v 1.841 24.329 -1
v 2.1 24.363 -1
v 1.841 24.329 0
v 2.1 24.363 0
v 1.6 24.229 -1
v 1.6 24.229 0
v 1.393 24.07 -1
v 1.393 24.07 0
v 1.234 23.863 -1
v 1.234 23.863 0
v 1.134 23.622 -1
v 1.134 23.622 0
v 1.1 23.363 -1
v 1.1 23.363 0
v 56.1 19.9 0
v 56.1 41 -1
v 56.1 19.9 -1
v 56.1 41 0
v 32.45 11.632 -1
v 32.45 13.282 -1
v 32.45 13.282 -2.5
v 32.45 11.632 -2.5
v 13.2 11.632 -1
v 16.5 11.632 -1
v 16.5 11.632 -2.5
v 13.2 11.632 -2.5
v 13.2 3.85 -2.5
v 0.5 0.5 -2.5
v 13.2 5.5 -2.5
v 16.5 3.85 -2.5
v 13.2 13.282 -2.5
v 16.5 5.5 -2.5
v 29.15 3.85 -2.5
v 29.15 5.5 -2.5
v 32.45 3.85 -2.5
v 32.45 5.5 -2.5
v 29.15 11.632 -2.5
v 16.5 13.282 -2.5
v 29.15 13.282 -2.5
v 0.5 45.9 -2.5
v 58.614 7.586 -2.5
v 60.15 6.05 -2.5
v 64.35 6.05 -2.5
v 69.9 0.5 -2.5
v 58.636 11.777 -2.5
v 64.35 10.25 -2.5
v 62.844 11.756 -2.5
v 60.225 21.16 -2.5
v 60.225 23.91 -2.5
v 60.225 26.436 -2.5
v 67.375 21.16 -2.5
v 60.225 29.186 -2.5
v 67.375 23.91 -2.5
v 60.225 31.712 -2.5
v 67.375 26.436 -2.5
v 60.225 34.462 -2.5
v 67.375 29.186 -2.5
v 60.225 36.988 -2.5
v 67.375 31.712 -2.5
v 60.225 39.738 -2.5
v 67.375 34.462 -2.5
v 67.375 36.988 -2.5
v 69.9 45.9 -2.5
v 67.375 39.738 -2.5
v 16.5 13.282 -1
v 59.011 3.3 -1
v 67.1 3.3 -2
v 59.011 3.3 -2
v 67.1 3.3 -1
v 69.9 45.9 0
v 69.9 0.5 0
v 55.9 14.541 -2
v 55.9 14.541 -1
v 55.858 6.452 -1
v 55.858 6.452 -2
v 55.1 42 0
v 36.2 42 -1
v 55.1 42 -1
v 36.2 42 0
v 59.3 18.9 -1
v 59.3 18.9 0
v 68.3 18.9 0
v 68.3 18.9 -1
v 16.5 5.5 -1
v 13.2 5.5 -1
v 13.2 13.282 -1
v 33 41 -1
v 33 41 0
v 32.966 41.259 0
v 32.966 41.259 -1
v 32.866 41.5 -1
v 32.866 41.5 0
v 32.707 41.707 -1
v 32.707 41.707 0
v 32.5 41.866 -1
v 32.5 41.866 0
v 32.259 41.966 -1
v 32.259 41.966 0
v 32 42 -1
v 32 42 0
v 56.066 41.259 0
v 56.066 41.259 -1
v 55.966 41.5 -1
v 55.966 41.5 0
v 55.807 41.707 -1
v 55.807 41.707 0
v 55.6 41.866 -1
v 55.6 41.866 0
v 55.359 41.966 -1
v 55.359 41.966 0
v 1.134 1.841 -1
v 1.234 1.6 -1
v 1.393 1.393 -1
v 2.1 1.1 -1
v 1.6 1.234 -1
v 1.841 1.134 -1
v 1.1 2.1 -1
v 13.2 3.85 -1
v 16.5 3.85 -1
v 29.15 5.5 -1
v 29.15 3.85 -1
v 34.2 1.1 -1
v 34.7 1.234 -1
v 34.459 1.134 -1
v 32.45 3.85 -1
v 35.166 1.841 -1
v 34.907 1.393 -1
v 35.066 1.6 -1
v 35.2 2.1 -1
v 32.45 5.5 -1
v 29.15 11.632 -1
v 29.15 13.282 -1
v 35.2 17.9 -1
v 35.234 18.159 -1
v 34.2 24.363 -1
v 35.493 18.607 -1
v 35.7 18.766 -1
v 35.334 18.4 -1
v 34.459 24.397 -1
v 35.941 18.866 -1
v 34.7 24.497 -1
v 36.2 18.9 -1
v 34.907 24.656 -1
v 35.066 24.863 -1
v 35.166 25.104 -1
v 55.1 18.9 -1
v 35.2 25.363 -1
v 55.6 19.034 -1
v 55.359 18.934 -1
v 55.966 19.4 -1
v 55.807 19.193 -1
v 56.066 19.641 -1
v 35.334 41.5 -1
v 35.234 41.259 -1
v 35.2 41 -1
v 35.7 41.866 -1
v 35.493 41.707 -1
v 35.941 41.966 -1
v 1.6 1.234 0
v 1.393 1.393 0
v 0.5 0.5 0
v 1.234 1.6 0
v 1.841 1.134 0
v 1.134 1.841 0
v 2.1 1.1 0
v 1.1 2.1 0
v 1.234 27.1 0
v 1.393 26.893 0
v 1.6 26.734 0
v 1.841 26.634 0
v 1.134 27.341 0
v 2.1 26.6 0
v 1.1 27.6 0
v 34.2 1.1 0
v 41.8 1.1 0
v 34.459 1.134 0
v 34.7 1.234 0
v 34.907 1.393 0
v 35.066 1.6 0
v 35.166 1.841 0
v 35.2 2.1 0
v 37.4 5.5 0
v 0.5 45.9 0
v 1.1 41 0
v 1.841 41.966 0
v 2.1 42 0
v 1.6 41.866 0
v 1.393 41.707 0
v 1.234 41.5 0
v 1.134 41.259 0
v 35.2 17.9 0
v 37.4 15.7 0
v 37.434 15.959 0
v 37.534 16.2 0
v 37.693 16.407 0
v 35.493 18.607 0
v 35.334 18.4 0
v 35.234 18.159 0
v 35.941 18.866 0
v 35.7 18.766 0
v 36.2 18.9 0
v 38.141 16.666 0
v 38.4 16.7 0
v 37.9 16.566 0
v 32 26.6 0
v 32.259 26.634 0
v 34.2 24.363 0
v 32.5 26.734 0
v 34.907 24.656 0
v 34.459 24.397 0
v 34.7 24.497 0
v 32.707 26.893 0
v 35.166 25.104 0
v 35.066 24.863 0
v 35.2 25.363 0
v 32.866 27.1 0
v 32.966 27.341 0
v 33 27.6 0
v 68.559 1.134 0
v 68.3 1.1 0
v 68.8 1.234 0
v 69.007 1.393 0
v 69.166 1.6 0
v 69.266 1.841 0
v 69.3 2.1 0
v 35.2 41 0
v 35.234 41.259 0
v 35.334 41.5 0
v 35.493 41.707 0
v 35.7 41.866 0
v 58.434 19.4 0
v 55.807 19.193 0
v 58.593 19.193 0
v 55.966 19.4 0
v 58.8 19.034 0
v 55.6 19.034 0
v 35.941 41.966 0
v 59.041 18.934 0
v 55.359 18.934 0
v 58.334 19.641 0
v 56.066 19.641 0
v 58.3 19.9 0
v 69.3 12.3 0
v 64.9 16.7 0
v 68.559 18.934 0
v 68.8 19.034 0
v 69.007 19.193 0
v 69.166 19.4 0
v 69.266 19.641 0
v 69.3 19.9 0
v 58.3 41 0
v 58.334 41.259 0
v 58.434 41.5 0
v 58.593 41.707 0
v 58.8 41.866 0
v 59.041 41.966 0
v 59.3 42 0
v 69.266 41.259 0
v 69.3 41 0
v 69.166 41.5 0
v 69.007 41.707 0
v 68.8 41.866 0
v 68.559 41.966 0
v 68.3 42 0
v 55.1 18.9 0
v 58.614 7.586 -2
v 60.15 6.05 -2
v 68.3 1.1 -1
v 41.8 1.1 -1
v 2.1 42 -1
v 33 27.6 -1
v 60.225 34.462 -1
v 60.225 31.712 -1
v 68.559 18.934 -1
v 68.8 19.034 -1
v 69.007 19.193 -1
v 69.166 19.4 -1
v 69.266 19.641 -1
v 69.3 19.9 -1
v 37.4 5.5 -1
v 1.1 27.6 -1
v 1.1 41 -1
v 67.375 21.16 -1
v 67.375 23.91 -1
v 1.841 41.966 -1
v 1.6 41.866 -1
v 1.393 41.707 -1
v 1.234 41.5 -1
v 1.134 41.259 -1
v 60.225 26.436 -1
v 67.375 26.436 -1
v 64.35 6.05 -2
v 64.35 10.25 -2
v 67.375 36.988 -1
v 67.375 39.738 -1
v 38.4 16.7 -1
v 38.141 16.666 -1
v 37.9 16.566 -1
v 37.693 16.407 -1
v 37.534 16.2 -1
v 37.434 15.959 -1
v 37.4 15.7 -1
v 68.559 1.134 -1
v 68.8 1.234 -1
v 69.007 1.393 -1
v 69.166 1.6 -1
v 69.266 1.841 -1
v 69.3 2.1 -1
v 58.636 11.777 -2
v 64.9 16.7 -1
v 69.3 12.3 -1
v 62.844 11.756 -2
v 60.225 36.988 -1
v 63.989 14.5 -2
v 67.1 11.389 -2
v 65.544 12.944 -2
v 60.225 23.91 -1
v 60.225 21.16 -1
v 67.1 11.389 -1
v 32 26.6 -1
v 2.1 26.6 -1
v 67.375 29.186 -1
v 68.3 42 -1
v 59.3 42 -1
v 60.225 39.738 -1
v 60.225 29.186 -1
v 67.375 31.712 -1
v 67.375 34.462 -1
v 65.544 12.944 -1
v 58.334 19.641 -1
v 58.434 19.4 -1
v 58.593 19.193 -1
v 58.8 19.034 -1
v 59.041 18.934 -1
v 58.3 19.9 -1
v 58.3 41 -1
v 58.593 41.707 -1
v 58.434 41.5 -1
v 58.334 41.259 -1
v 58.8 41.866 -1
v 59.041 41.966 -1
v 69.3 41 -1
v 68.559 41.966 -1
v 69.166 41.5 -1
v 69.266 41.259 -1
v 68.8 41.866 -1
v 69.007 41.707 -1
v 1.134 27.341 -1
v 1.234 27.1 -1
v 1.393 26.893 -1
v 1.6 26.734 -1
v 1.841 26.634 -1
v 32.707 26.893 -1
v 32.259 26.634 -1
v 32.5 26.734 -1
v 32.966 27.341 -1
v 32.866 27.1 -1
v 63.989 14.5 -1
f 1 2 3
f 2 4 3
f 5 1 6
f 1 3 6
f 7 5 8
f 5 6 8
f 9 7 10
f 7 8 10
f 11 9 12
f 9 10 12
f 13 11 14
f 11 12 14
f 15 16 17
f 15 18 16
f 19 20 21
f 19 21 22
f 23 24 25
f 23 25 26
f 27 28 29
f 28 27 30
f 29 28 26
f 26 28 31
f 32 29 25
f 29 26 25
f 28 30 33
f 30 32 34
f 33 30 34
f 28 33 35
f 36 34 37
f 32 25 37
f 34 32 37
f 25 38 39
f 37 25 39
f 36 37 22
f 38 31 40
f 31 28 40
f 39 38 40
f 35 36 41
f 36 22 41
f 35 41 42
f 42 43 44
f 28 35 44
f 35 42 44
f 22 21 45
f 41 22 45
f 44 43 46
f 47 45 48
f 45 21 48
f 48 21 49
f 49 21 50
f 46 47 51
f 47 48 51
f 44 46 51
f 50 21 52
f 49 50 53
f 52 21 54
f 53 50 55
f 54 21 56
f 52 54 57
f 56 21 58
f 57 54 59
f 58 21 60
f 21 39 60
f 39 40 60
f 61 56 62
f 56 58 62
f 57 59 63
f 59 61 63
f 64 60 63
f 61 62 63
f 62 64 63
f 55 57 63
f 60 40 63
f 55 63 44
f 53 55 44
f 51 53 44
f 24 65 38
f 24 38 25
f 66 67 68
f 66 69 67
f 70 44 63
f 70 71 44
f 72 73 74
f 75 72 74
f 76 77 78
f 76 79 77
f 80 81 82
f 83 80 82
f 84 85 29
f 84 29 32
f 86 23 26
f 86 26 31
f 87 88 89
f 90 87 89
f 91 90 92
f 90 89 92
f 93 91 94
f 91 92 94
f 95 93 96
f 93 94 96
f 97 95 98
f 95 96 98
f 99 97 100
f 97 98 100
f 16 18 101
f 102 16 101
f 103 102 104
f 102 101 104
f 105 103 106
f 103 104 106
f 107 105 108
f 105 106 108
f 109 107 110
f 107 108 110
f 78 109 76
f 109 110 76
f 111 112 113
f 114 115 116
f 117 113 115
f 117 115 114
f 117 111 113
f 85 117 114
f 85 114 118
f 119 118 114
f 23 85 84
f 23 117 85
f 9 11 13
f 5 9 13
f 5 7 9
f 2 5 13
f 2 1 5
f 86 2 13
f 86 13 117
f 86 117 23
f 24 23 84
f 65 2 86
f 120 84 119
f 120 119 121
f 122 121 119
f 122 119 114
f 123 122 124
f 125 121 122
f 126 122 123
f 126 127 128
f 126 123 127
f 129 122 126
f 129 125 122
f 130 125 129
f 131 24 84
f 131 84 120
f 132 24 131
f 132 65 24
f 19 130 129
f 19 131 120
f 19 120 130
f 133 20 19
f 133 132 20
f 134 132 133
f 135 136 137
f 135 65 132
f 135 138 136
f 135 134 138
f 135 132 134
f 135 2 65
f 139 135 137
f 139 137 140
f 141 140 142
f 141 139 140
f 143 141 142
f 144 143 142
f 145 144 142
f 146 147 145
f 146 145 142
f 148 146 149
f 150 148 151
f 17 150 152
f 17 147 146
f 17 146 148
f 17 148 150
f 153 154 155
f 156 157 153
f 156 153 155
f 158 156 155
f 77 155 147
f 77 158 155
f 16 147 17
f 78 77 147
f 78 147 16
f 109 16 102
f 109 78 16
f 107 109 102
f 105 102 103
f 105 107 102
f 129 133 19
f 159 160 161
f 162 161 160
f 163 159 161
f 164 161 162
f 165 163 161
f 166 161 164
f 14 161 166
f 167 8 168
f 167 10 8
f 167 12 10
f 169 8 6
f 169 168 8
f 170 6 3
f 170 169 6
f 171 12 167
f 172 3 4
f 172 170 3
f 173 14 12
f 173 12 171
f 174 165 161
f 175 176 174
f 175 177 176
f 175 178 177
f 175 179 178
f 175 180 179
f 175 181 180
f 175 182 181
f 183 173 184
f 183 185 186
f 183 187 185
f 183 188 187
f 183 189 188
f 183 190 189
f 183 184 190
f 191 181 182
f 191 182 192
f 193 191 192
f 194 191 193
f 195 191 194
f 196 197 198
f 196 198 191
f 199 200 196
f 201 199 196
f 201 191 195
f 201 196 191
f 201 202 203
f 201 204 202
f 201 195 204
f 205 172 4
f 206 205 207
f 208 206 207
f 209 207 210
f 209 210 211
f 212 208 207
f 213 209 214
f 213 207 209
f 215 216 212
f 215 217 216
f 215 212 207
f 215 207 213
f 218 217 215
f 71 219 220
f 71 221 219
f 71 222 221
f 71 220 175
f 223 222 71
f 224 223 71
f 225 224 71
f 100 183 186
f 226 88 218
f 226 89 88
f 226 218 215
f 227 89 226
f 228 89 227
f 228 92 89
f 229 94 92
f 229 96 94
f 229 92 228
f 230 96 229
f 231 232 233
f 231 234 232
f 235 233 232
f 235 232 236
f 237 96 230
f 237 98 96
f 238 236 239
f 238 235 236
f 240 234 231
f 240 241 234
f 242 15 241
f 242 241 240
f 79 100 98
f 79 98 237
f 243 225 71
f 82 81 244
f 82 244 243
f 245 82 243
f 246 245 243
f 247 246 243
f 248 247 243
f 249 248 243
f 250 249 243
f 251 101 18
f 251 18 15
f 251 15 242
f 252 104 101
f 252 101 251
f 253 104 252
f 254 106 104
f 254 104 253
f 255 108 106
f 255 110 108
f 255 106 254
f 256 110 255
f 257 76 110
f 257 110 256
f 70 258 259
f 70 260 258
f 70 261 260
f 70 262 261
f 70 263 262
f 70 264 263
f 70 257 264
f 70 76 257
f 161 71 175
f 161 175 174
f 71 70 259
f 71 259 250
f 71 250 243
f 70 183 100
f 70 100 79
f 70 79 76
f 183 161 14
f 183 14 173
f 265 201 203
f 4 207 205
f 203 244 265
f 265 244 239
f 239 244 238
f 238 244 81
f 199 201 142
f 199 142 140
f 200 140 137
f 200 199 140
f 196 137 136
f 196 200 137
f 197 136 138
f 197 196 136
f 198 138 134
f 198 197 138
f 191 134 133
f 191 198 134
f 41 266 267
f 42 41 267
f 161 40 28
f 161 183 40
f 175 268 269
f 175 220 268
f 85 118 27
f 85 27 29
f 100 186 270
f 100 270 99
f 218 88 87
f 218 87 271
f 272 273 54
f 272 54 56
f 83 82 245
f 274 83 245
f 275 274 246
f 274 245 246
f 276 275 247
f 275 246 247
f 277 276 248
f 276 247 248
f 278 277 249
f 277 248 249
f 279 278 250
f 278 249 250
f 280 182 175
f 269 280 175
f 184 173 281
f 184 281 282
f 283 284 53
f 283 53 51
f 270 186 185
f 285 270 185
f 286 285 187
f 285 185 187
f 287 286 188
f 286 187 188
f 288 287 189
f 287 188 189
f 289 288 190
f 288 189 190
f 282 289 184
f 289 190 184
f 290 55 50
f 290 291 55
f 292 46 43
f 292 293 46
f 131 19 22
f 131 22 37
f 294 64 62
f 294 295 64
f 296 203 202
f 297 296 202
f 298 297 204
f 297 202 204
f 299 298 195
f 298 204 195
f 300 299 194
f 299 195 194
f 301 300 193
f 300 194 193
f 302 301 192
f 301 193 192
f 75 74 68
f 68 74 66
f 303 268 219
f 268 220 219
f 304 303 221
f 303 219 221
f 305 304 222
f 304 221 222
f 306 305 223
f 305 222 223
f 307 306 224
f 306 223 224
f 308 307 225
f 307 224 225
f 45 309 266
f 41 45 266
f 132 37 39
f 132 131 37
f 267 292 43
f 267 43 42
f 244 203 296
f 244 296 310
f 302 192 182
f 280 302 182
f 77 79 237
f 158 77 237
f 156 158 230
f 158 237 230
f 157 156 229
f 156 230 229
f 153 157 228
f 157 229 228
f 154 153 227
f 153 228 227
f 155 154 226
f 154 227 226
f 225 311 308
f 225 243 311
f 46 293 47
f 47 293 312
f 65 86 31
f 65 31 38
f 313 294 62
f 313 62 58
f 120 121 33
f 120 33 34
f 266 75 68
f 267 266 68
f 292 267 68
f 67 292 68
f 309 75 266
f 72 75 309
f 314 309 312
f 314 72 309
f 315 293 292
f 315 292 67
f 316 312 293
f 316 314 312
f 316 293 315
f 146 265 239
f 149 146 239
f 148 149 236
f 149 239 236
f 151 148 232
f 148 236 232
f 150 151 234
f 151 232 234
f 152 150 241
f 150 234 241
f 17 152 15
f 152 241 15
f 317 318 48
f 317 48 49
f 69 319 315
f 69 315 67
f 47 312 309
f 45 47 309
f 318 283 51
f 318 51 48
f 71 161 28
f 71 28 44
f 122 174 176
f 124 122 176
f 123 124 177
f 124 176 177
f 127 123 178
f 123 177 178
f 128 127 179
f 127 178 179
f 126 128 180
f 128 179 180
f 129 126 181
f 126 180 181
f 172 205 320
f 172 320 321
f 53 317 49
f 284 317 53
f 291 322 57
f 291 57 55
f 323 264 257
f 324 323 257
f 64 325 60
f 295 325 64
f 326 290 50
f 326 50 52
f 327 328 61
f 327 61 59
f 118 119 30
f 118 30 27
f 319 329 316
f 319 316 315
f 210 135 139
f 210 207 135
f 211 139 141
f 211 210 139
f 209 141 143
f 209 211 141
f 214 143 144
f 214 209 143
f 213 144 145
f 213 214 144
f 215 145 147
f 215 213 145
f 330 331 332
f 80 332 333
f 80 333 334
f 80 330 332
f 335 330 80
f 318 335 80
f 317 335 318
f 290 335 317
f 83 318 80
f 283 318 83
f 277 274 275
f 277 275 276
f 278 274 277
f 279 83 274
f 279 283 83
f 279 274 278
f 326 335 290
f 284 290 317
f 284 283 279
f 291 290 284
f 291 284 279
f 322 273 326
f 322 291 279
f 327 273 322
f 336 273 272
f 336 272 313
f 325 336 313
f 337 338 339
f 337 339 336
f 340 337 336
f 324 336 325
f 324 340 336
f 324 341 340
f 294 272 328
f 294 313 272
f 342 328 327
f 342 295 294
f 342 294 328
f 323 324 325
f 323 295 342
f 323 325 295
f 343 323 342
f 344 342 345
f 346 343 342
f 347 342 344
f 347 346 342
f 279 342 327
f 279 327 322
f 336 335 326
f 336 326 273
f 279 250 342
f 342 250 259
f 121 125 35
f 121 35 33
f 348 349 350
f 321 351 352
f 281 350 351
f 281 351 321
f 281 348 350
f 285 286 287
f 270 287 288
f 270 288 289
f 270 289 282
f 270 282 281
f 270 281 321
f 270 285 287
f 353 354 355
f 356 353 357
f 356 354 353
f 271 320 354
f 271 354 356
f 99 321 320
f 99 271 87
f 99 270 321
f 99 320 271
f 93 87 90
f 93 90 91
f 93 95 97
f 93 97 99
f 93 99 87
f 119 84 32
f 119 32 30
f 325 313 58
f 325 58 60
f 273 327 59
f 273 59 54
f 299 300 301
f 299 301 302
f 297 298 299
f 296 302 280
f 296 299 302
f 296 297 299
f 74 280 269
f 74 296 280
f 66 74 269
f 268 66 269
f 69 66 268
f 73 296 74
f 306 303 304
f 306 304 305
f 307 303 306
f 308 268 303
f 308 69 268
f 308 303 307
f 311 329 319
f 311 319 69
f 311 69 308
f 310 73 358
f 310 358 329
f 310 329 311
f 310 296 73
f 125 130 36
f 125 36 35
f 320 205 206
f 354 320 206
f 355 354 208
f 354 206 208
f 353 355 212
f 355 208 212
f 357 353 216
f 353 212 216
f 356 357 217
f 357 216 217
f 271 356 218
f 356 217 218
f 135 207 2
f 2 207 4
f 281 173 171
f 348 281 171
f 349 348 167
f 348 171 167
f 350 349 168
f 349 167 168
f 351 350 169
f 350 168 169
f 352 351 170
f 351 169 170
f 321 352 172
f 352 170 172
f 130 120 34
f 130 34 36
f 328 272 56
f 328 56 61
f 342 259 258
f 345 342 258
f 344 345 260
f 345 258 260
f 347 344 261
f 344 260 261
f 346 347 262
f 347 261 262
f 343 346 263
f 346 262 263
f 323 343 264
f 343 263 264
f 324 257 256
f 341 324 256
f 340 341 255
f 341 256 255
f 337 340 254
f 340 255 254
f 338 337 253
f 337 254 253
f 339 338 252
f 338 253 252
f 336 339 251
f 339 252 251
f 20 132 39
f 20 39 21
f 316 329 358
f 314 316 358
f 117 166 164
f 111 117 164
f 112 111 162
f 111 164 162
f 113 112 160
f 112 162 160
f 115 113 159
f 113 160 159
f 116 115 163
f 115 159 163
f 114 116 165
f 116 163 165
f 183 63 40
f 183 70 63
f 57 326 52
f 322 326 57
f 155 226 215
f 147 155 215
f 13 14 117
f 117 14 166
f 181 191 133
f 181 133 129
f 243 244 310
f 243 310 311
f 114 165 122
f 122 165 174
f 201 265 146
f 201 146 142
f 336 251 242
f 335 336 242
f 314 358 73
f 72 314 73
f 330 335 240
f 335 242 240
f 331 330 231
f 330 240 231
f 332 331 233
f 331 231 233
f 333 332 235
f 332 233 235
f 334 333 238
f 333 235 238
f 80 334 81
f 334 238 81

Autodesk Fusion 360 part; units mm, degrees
sketch "Sketch1" plane through (0, 0, 0) normal (0, 0, 1) x (1, 0, 0)
  line L0 (0, 0) -> (70.4, 0)
  line L1 (70.4, 0) -> (70.4, 46.4)
  line L2 (70.4, 46.4) -> (0, 46.4)
  line L3 (0, 46.4) -> (0, 0)
  line L4 (1.1, 1.1) -> (69.3, 1.1) construction
  line L5 (69.3, 1.1) -> (69.3, 45.3) construction
  line L6 (69.3, 45.3) -> (1.1, 45.3) construction
  line L7 (1.1, 45.3) -> (1.1, 1.1) construction
  line L8 (35.2, 45.3) -> (35.2, 1.1) construction
  line L9 (1.1, 23.2) -> (35.2, 23.2) construction
  line L10 (35.2, 23.2) -> (69.3, 23.2) construction
  line L11 (35.2, 45.3) -> (35.2, 42) construction
  line L12 (35.2, 42) -> (35, 42) construction
  line L13 (35, 42) -> (1.1, 42) construction
  line L14 (35.2, 42) -> (69.3, 42) construction
  line L15 (68.3, 42) -> (59.3, 42)
  line L16 (58.3, 41) -> (58.3, 19.9)
  line L17 (59.3, 18.9) -> (68.3, 18.9)
  line L18 (69.3, 19.9) -> (69.3, 41)
  line L19 (58.3, 30.45) -> (56.1, 30.45) construction
  line L20 (36.2, 42) -> (55.1, 42)
  line L21 (56.1, 41) -> (56.1, 19.9)
  line L22 (55.1, 18.9) -> (36.2, 18.9)
  line L23 (35.2, 30.45) -> (33, 30.45) construction
  line L24 (2.1, 42) -> (32, 42)
  line L25 (33, 41) -> (33, 27.6)
  line L26 (32, 26.6) -> (2.1, 26.6)
  line L27 (1.1, 27.6) -> (1.1, 41)
  line L28 (17.05, 26.6) -> (17.05, 24.4) construction
  line L29 (45.65, 18.9) -> (45.65, 16.7) construction
  line L30 (2.1, 1.1) -> (34.2, 1.1)
  line L31 (34.2, 24.3632) -> (2.1, 24.3632)
  line L32 (1.1, 23.3632) -> (1.1, 2.1)
  line L33 (35.2, 41) -> (35.2, 25.3632)
  line L34 (35.2, 17.9) -> (35.2, 2.1)
  line L35 (18.15, 24.3632) -> (18.15, 17.7632) construction
  line L36 (1.1, 1.1) -> (1.1, 2.2) construction
  line L37 (1.1, 1.1) -> (2.2, 1.1) construction
  line L38 (35.2, 1.1) -> (35.2, 2.2) construction
  line L39 (35.2, 1.1) -> (34.1, 1.1) construction
  line L40 (2.2, 2.2) -> (34.1, 2.2) construction
  line L41 (34.1, 2.2) -> (34.1, 17.7632) construction
  line L42 (34.1, 17.7632) -> (18.15, 17.7632) construction
  line L43 (2.2, 2.2) -> (2.2, 17.7632) construction
  line L44 (2.2, 17.7632) -> (18.15, 17.7632) construction
  line L45 (18.15, 2.2) -> (18.15, 17.7632) construction
  line L46 (18.15, 9.9816) -> (34.1, 9.9816) construction
  line L47 (18.15, 9.9816) -> (2.2, 9.9816) construction
  line L48 (10.175, 9.9816) -> (10.175, 11.0816) construction
  line L49 (18.15, 9.9816) -> (18.15, 17.7632) construction
  line L50 (18.15, 9.9816) -> (18.15, 2.2) construction
  line L51 (18.15, 13.8724) -> (17.05, 13.8724) construction
  line L52 (2.2, 2.2) -> (18.15, 2.2) construction
  line L53 (18.15, 2.2) -> (34.1, 2.2) construction
  line L54 (10.175, 2.2) -> (10.175, 3.3) construction
  line L55 (18.15, 6.0908) -> (17.05, 6.0908) construction
  line L56 (26.125, 2.2) -> (26.125, 3.3) construction
  line L57 (18.15, 6.0908) -> (19.25, 6.0908) construction
  line L58 (18.15, 13.8724) -> (19.25, 13.8724) construction
  line L59 (26.125, 9.9816) -> (26.125, 11.0816) construction
  line L60 (3.3, 16.6632) -> (17.05, 16.6632) construction
  line L61 (17.05, 16.6632) -> (17.05, 11.0816) construction
  line L62 (17.05, 11.0816) -> (3.3, 11.0816) construction
  line L63 (3.3, 11.0816) -> (3.3, 16.6632) construction
  line L64 (3.3, 8.8816) -> (17.05, 8.8816) construction
  line L65 (17.05, 8.8816) -> (17.05, 3.3) construction
  line L66 (17.05, 3.3) -> (3.3, 3.3) construction
  line L67 (3.3, 3.3) -> (3.3, 8.8816) construction
  line L68 (19.25, 8.8816) -> (33, 8.8816) construction
  line L69 (33, 8.8816) -> (33, 3.3) construction
  line L70 (33, 3.3) -> (19.25, 3.3) construction
  line L71 (19.25, 3.3) -> (19.25, 8.8816) construction
  line L72 (19.25, 16.6632) -> (33, 16.6632) construction
  line L73 (33, 16.6632) -> (33, 11.0816) construction
  line L74 (33, 11.0816) -> (19.25, 11.0816) construction
  line L75 (19.25, 11.0816) -> (19.25, 16.6632) construction
  line L76 (17.05, 11.0816) -> (17.05, 11.6316) construction
  line L77 (17.05, 11.0816) -> (16.5, 11.0816) construction
  line L78 (33, 11.0816) -> (33, 11.6316) construction
  line L79 (33, 11.0816) -> (32.45, 11.0816) construction
  line L80 (33, 3.3) -> (33, 3.85) construction
  line L81 (33, 3.3) -> (32.45, 3.3) construction
  line L82 (17.05, 3.3) -> (16.5, 3.3) construction
  line L83 (17.05, 3.3) -> (17.05, 3.85) construction
  line L84 (16.5, 11.6316) -> (13.2, 11.6316)
  line L85 (13.2, 11.6316) -> (13.2, 13.2816)
  line L86 (13.2, 13.2816) -> (16.5, 13.2816)
  line L87 (16.5, 13.2816) -> (16.5, 11.6316)
  line L88 (32.45, 11.6316) -> (29.15, 11.6316)
  line L89 (29.15, 11.6316) -> (29.15, 13.2816)
  line L90 (29.15, 13.2816) -> (32.45, 13.2816)
  line L91 (32.45, 13.2816) -> (32.45, 11.6316)
  line L92 (32.45, 3.85) -> (29.15, 3.85)
  line L93 (29.15, 3.85) -> (29.15, 5.5)
  line L94 (29.15, 5.5) -> (32.45, 5.5)
  line L95 (32.45, 5.5) -> (32.45, 3.85)
  line L96 (16.5, 3.85) -> (13.2, 3.85)
  line L97 (13.2, 3.85) -> (13.2, 5.5)
  line L98 (13.2, 5.5) -> (16.5, 5.5)
  line L99 (16.5, 5.5) -> (16.5, 3.85)
  line L100 (35.2, 10) -> (37.4, 10) construction
  line L101 (37.4, 16.7) -> (69.3, 16.7) construction
  line L102 (69.3, 16.7) -> (64.9, 16.7) construction
  line L103 (69.3, 16.7) -> (69.3, 12.3) construction
  line L104 (64.9, 16.7) -> (69.3, 12.3)
  line L105 (37.4, 1.1) -> (37.4, 5.5) construction
  line L106 (37.4, 1.1) -> (41.8, 1.1) construction
  line L107 (37.4, 5.5) -> (41.8, 1.1)
  line L108 (37.4, 15.7) -> (37.4, 5.5)
  line L109 (38.4, 16.7) -> (64.9, 16.7)
  line L110 (69.3, 12.3) -> (69.3, 2.1)
  line L111 (68.3, 1.1) -> (41.8, 1.1)
  line L112 (67.1, 14.5) -> (65.5444, 12.9444) construction
  line L113 (65.5444, 12.9444) -> (67.1, 11.3887)
  line L114 (65.5444, 12.9444) -> (63.9887, 14.5)
  line L115 (67.1, 11.3887) -> (69.3, 11.4) construction
  line L116 (63.9887, 14.5) -> (64, 16.7) construction
  line L117 (67.1, 1.1) -> (67.1, 3.3) construction
  line L118 (67.1, 11.3887) -> (67.1, 3.3)
  line L119 (67.1, 3.3) -> (59.011, 3.3)
  line L120 (63.9887, 14.5) -> (55.8998, 14.5414)
  line L121 (55.8998, 14.5414) -> (55.8584, 6.4525)
  line L122 (55.8584, 6.4525) -> (59.011, 3.3)
  line L123 (58.6142, 7.5858) -> (60.1501, 6.05)
  line L124 (64.35, 6.05) -> (60.1501, 6.05)
  line L125 (64.35, 10.2496) -> (64.35, 6.05)
  line L126 (63.5998, 10.9998) -> (64.35, 10.2496)
  line L127 (63.5998, 10.9998) -> (62.8438, 11.7558)
  line L128 (62.8438, 11.7558) -> (58.6357, 11.7774)
  line L129 (58.6357, 11.7774) -> (58.6142, 7.5858)
  arc A0 (2.1, 42) -> (1.1, 41) centre (2.1, 41) ccw
  arc A1 (33, 41) -> (32, 42) centre (32, 41) ccw
  arc A2 (32, 26.6) -> (33, 27.6) centre (32, 27.6) ccw
  arc A3 (1.1, 27.6) -> (2.1, 26.6) centre (2.1, 27.6) ccw
  arc A4 (36.2, 42) -> (35.2, 41) centre (36.2, 41) ccw
  arc A5 (56.1, 41) -> (55.1, 42) centre (55.1, 41) ccw
  arc A6 (55.1, 18.9) -> (56.1, 19.9) centre (55.1, 19.9) ccw
  arc A7 (36.2, 18.9) -> (35.2, 17.9) centre (36.2, 17.9) ccw
  arc A8 (34.2, 1.1) -> (35.2, 2.1) centre (34.2, 2.1) ccw
  arc A9 (1.1, 2.1) -> (2.1, 1.1) centre (2.1, 2.1) ccw
  arc A10 (2.1, 24.3632) -> (1.1, 23.3632) centre (2.1, 23.3632) ccw
  arc A11 (34.2, 24.3632) -> (35.2, 25.3632) centre (34.2, 25.3632) ccw
  arc A12 (38.4, 16.7) -> (37.4, 15.7) centre (38.4, 15.7) ccw
  arc A13 (68.3, 1.1) -> (69.3, 2.1) centre (68.3, 2.1) ccw
  arc A14 (59.3, 42) -> (58.3, 41) centre (59.3, 41) ccw
  arc A15 (58.3, 19.9) -> (59.3, 18.9) centre (59.3, 19.9) ccw
  arc A16 (68.3, 18.9) -> (69.3, 19.9) centre (68.3, 19.9) ccw
  arc A17 (69.3, 41) -> (68.3, 42) centre (68.3, 41) ccw
  line L130 (58.3, 41) -> (69.3, 41) construction
  line L131 (58.3, 19.9) -> (69.3, 19.9) construction
  line L132 (63.8, 19.9) -> (63.8, 41) construction
  line L133 (60.225, 39.7375) -> (67.375, 39.7375)
  line L134 (67.375, 39.7375) -> (67.375, 36.9875)
  line L135 (67.375, 36.9875) -> (60.225, 36.9875)
  line L136 (60.225, 36.9875) -> (60.225, 39.7375)
  line L137 (63.8, 41) -> (63.8, 39.7375) construction
  line L138 (60.225, 31.7115) -> (60.225, 34.4615)
  line L139 (60.225, 34.4615) -> (67.375, 34.4615)
  line L140 (67.375, 31.7115) -> (60.225, 31.7115)
  line L141 (67.375, 34.4615) -> (67.375, 31.7115)
  line L142 (67.375, 26.4355) -> (60.225, 26.4355)
  line L143 (60.225, 26.4355) -> (60.225, 29.1855)
  line L144 (67.375, 29.1855) -> (67.375, 26.4355)
  line L145 (60.225, 29.1855) -> (67.375, 29.1855)
  line L146 (60.225, 21.1595) -> (60.225, 23.9095)
  line L147 (60.225, 23.9095) -> (67.375, 23.9095)
  line L148 (67.375, 21.1595) -> (60.225, 21.1595)
  line L149 (67.375, 23.9095) -> (67.375, 21.1595)
  line L150 (63.8, 36.9875) -> (63.8, 34.4615) construction
  line L151 (63.8, 31.7115) -> (63.8, 29.1855) construction
  line L152 (63.8, 26.4355) -> (63.8, 23.9095) construction
  line L153 (70.4, 33.0328) -> (68.4, 33.0328) construction
  line L154 (13.2, 4.675) -> (11.2, 4.675) construction
  line L155 (14.85, 3.85) -> (14.85, 1.85) construction
  line L156 (11.2, 1.85) -> (68.3, 1.85)
  line L157 (68.3, 1.85) -> (68.3, 42.6341)
  line L158 (68.3, 42.6341) -> (11.2, 42.6341)
  line L159 (11.2, 42.6341) -> (11.2, 1.85)
  point P0 (58.3, 42)
  point P1 (69.3, 18.9)
  point P2 (56.1, 42)
  point P3 (56.1, 18.9)
  point P4 (35.2, 18.9)
  point P5 (1.1, 26.6)
  dimension "d1" = 46.4
  dimension "d2" = 70.4
  dimension "d3" = -1.1
  dimension "d5" = 3.3
  dimension "d6" = 11
  dimension "d7" = 23.1
  dimension "d8" = 2.2
  dimension "d9" = 23.1
  dimension "d10" = 20.9
  dimension "d11" = 2.2
  dimension "d12" = 15.4
  dimension "d13" = 2.2
  dimension "d14" = 2.2
  dimension "d16" = 6.6
  dimension "d18" = 1.1
  dimension "d19" = 1.1
  dimension "d20" = 1.1
  dimension "d21" = 1.1
  dimension "d22" = 1.1
  dimension "d23" = 1.1
  dimension "d24" = 1.1
  dimension "d25" = 1.1
  dimension "d26" = 1.1
  dimension "d27" = 1.1
  dimension "d28" = 1.1
  dimension "d29" = 1.1
  dimension "d30" = 0.55
  dimension "d31" = 0.55
  dimension "d32" = 0.55
  dimension "d33" = 0.55
  dimension "d34" = 0.55
  dimension "d35" = 0.55
  dimension "d36" = 0.55
  dimension "d37" = 0.55
  dimension "d38" = 3.3
  dimension "d39" = 1.65
  dimension "d40" = 3.3
  dimension "d41" = 1.65
  dimension "d42" = 3.3
  dimension "d43" = 1.65
  dimension "d44" = 3.3
  dimension "d45" = 1.65
  dimension "d46" = 2.2
  dimension "d47" = 4.4
  dimension "d48" = 4.4
  dimension "d49" = 4.4
  dimension "d50" = 4.4
  dimension "d51" = 2.2
  dimension "d52" = 2.2
  dimension "d53" = 2.2
  dimension "d55" = 2.2
  dimension "d56" = 8.089
  dimension "d57" = 8.089
  dimension "d58" = 8.089
  dimension "d59" = -2.75
  dimension "d60" = 1
  dimension "d61" = 1
  dimension "d62" = 1
  dimension "d63" = 1
  dimension "d64" = 1
  dimension "d65" = 2.75
  dimension "d66" = 1.2625
  dimension "d67" = 7.15
  dimension "d68" = 2.75
  dimension "d69" = 7.15
  dimension "d70" = 2.75
  dimension "d71" = 7.15
  dimension "d72" = 2.75
  dimension "d73" = 7.15
  dimension "d74" = 2.526
  dimension "d75" = 2.526
  dimension "d76" = 2.526
  dimension "d93" = 2
  dimension "d94" = 2
  dimension "d95" = 2
extrude "Extrude1" add sketch "Sketch1" against normal blind 2.5 contours L0 L1 L2 L3 | L15 L16 L17 A14 A15 L157 | L18 A16 A17 L157 | L15 L16 L17 L20 L21 L22 L24 L25 L26 L31 L33 L34 L104 L107 L108 L109 A1 A2 A4 A5 A6 A7 A8 A11 A12 A14 A15 L156 L157 L158 L159 | L104 L107 L108 L109 A12 L156 L157 | L104 L107 L110 L111 A13 L156 L157 | L24 L26 L27 A0 A3 L159 | L24 L25 L26 A1 A2 L159 | L20 L21 L22 L31 L33 L34 A4 A5 A6 A7 A8 A11 L156 L159 | L30 L31 L32 A8 A9 A10 L156 L159 | L84 L85 L86 L87 | L88 L89 L90 L91 | L92 L93 L94 L95 | L96 L97 L98 L99 | L113 L114 L118 L119 L120 L121 L122 | L123 L124 L125 L126 L127 L128 L129 | L133 L134 L135 L136 | L138 L139 L140 L141 | L142 L143 L144 L145 | L146 L147 L148 L149
extrude "Extrude2" cut sketch "Sketch1" against normal blind 1 contours L15 L16 L17 A14 A15 L157 | L18 A16 A17 L157 | L104 L107 L108 L109 A12 L156 L157 | L104 L107 L110 L111 A13 L156 L157 | L24 L26 L27 A0 A3 L159 | L24 L25 L26 A1 A2 L159 | L20 L21 L22 L31 L33 L34 A4 A5 A6 A7 A8 A11 L156 L159 | L30 L31 L32 A8 A9 A10 L156 L159 | L84 L85 L86 L87 | L88 L89 L90 L91 | L92 L93 L94 L95 | L96 L97 L98 L99 | L113 L114 L118 L119 L120 L121 L122 | L123 L124 L125 L126 L127 L128 L129 | L133 L134 L135 L136 | L138 L139 L140 L141 | L142 L143 L144 L145 | L146 L147 L148 L149
extrude "Extrude3" cut sketch "Sketch1" against normal blind 2 contours L113 L114 L118 L119 L120 L121 L122 | L123 L124 L125 L126 L127 L128 L129
extrude "Extrude4" cut sketch "Sketch1" against normal blind 10 contours L84 L85 L86 L87 | L88 L89 L90 L91 | L92 L93 L94 L95 | L96 L97 L98 L99 | L123 L124 L125 L126 L127 L128 L129 | L133 L134 L135 L136 | L138 L139 L140 L141 | L142 L143 L144 L145 | L146 L147 L148 L149
extrude "Extrude5" cut 1 faces at (23.4667, 0, -0.8333) along direction (0, 1, 0) blind 0.5
extrude "Extrude6" cut 1 faces at (46.9333, 46.4, -0.8333) along direction (0, -1, 0) blind 0.5
extrude "Extrude7" cut 1 faces at (70.4, 15.6333, -0.8333) along direction (-1, 0, 0) blind 0.5
extrude "Extrude8" cut 1 faces at (0, 30.7667, -0.8333) along direction (1, 0, 0) blind 0.5
